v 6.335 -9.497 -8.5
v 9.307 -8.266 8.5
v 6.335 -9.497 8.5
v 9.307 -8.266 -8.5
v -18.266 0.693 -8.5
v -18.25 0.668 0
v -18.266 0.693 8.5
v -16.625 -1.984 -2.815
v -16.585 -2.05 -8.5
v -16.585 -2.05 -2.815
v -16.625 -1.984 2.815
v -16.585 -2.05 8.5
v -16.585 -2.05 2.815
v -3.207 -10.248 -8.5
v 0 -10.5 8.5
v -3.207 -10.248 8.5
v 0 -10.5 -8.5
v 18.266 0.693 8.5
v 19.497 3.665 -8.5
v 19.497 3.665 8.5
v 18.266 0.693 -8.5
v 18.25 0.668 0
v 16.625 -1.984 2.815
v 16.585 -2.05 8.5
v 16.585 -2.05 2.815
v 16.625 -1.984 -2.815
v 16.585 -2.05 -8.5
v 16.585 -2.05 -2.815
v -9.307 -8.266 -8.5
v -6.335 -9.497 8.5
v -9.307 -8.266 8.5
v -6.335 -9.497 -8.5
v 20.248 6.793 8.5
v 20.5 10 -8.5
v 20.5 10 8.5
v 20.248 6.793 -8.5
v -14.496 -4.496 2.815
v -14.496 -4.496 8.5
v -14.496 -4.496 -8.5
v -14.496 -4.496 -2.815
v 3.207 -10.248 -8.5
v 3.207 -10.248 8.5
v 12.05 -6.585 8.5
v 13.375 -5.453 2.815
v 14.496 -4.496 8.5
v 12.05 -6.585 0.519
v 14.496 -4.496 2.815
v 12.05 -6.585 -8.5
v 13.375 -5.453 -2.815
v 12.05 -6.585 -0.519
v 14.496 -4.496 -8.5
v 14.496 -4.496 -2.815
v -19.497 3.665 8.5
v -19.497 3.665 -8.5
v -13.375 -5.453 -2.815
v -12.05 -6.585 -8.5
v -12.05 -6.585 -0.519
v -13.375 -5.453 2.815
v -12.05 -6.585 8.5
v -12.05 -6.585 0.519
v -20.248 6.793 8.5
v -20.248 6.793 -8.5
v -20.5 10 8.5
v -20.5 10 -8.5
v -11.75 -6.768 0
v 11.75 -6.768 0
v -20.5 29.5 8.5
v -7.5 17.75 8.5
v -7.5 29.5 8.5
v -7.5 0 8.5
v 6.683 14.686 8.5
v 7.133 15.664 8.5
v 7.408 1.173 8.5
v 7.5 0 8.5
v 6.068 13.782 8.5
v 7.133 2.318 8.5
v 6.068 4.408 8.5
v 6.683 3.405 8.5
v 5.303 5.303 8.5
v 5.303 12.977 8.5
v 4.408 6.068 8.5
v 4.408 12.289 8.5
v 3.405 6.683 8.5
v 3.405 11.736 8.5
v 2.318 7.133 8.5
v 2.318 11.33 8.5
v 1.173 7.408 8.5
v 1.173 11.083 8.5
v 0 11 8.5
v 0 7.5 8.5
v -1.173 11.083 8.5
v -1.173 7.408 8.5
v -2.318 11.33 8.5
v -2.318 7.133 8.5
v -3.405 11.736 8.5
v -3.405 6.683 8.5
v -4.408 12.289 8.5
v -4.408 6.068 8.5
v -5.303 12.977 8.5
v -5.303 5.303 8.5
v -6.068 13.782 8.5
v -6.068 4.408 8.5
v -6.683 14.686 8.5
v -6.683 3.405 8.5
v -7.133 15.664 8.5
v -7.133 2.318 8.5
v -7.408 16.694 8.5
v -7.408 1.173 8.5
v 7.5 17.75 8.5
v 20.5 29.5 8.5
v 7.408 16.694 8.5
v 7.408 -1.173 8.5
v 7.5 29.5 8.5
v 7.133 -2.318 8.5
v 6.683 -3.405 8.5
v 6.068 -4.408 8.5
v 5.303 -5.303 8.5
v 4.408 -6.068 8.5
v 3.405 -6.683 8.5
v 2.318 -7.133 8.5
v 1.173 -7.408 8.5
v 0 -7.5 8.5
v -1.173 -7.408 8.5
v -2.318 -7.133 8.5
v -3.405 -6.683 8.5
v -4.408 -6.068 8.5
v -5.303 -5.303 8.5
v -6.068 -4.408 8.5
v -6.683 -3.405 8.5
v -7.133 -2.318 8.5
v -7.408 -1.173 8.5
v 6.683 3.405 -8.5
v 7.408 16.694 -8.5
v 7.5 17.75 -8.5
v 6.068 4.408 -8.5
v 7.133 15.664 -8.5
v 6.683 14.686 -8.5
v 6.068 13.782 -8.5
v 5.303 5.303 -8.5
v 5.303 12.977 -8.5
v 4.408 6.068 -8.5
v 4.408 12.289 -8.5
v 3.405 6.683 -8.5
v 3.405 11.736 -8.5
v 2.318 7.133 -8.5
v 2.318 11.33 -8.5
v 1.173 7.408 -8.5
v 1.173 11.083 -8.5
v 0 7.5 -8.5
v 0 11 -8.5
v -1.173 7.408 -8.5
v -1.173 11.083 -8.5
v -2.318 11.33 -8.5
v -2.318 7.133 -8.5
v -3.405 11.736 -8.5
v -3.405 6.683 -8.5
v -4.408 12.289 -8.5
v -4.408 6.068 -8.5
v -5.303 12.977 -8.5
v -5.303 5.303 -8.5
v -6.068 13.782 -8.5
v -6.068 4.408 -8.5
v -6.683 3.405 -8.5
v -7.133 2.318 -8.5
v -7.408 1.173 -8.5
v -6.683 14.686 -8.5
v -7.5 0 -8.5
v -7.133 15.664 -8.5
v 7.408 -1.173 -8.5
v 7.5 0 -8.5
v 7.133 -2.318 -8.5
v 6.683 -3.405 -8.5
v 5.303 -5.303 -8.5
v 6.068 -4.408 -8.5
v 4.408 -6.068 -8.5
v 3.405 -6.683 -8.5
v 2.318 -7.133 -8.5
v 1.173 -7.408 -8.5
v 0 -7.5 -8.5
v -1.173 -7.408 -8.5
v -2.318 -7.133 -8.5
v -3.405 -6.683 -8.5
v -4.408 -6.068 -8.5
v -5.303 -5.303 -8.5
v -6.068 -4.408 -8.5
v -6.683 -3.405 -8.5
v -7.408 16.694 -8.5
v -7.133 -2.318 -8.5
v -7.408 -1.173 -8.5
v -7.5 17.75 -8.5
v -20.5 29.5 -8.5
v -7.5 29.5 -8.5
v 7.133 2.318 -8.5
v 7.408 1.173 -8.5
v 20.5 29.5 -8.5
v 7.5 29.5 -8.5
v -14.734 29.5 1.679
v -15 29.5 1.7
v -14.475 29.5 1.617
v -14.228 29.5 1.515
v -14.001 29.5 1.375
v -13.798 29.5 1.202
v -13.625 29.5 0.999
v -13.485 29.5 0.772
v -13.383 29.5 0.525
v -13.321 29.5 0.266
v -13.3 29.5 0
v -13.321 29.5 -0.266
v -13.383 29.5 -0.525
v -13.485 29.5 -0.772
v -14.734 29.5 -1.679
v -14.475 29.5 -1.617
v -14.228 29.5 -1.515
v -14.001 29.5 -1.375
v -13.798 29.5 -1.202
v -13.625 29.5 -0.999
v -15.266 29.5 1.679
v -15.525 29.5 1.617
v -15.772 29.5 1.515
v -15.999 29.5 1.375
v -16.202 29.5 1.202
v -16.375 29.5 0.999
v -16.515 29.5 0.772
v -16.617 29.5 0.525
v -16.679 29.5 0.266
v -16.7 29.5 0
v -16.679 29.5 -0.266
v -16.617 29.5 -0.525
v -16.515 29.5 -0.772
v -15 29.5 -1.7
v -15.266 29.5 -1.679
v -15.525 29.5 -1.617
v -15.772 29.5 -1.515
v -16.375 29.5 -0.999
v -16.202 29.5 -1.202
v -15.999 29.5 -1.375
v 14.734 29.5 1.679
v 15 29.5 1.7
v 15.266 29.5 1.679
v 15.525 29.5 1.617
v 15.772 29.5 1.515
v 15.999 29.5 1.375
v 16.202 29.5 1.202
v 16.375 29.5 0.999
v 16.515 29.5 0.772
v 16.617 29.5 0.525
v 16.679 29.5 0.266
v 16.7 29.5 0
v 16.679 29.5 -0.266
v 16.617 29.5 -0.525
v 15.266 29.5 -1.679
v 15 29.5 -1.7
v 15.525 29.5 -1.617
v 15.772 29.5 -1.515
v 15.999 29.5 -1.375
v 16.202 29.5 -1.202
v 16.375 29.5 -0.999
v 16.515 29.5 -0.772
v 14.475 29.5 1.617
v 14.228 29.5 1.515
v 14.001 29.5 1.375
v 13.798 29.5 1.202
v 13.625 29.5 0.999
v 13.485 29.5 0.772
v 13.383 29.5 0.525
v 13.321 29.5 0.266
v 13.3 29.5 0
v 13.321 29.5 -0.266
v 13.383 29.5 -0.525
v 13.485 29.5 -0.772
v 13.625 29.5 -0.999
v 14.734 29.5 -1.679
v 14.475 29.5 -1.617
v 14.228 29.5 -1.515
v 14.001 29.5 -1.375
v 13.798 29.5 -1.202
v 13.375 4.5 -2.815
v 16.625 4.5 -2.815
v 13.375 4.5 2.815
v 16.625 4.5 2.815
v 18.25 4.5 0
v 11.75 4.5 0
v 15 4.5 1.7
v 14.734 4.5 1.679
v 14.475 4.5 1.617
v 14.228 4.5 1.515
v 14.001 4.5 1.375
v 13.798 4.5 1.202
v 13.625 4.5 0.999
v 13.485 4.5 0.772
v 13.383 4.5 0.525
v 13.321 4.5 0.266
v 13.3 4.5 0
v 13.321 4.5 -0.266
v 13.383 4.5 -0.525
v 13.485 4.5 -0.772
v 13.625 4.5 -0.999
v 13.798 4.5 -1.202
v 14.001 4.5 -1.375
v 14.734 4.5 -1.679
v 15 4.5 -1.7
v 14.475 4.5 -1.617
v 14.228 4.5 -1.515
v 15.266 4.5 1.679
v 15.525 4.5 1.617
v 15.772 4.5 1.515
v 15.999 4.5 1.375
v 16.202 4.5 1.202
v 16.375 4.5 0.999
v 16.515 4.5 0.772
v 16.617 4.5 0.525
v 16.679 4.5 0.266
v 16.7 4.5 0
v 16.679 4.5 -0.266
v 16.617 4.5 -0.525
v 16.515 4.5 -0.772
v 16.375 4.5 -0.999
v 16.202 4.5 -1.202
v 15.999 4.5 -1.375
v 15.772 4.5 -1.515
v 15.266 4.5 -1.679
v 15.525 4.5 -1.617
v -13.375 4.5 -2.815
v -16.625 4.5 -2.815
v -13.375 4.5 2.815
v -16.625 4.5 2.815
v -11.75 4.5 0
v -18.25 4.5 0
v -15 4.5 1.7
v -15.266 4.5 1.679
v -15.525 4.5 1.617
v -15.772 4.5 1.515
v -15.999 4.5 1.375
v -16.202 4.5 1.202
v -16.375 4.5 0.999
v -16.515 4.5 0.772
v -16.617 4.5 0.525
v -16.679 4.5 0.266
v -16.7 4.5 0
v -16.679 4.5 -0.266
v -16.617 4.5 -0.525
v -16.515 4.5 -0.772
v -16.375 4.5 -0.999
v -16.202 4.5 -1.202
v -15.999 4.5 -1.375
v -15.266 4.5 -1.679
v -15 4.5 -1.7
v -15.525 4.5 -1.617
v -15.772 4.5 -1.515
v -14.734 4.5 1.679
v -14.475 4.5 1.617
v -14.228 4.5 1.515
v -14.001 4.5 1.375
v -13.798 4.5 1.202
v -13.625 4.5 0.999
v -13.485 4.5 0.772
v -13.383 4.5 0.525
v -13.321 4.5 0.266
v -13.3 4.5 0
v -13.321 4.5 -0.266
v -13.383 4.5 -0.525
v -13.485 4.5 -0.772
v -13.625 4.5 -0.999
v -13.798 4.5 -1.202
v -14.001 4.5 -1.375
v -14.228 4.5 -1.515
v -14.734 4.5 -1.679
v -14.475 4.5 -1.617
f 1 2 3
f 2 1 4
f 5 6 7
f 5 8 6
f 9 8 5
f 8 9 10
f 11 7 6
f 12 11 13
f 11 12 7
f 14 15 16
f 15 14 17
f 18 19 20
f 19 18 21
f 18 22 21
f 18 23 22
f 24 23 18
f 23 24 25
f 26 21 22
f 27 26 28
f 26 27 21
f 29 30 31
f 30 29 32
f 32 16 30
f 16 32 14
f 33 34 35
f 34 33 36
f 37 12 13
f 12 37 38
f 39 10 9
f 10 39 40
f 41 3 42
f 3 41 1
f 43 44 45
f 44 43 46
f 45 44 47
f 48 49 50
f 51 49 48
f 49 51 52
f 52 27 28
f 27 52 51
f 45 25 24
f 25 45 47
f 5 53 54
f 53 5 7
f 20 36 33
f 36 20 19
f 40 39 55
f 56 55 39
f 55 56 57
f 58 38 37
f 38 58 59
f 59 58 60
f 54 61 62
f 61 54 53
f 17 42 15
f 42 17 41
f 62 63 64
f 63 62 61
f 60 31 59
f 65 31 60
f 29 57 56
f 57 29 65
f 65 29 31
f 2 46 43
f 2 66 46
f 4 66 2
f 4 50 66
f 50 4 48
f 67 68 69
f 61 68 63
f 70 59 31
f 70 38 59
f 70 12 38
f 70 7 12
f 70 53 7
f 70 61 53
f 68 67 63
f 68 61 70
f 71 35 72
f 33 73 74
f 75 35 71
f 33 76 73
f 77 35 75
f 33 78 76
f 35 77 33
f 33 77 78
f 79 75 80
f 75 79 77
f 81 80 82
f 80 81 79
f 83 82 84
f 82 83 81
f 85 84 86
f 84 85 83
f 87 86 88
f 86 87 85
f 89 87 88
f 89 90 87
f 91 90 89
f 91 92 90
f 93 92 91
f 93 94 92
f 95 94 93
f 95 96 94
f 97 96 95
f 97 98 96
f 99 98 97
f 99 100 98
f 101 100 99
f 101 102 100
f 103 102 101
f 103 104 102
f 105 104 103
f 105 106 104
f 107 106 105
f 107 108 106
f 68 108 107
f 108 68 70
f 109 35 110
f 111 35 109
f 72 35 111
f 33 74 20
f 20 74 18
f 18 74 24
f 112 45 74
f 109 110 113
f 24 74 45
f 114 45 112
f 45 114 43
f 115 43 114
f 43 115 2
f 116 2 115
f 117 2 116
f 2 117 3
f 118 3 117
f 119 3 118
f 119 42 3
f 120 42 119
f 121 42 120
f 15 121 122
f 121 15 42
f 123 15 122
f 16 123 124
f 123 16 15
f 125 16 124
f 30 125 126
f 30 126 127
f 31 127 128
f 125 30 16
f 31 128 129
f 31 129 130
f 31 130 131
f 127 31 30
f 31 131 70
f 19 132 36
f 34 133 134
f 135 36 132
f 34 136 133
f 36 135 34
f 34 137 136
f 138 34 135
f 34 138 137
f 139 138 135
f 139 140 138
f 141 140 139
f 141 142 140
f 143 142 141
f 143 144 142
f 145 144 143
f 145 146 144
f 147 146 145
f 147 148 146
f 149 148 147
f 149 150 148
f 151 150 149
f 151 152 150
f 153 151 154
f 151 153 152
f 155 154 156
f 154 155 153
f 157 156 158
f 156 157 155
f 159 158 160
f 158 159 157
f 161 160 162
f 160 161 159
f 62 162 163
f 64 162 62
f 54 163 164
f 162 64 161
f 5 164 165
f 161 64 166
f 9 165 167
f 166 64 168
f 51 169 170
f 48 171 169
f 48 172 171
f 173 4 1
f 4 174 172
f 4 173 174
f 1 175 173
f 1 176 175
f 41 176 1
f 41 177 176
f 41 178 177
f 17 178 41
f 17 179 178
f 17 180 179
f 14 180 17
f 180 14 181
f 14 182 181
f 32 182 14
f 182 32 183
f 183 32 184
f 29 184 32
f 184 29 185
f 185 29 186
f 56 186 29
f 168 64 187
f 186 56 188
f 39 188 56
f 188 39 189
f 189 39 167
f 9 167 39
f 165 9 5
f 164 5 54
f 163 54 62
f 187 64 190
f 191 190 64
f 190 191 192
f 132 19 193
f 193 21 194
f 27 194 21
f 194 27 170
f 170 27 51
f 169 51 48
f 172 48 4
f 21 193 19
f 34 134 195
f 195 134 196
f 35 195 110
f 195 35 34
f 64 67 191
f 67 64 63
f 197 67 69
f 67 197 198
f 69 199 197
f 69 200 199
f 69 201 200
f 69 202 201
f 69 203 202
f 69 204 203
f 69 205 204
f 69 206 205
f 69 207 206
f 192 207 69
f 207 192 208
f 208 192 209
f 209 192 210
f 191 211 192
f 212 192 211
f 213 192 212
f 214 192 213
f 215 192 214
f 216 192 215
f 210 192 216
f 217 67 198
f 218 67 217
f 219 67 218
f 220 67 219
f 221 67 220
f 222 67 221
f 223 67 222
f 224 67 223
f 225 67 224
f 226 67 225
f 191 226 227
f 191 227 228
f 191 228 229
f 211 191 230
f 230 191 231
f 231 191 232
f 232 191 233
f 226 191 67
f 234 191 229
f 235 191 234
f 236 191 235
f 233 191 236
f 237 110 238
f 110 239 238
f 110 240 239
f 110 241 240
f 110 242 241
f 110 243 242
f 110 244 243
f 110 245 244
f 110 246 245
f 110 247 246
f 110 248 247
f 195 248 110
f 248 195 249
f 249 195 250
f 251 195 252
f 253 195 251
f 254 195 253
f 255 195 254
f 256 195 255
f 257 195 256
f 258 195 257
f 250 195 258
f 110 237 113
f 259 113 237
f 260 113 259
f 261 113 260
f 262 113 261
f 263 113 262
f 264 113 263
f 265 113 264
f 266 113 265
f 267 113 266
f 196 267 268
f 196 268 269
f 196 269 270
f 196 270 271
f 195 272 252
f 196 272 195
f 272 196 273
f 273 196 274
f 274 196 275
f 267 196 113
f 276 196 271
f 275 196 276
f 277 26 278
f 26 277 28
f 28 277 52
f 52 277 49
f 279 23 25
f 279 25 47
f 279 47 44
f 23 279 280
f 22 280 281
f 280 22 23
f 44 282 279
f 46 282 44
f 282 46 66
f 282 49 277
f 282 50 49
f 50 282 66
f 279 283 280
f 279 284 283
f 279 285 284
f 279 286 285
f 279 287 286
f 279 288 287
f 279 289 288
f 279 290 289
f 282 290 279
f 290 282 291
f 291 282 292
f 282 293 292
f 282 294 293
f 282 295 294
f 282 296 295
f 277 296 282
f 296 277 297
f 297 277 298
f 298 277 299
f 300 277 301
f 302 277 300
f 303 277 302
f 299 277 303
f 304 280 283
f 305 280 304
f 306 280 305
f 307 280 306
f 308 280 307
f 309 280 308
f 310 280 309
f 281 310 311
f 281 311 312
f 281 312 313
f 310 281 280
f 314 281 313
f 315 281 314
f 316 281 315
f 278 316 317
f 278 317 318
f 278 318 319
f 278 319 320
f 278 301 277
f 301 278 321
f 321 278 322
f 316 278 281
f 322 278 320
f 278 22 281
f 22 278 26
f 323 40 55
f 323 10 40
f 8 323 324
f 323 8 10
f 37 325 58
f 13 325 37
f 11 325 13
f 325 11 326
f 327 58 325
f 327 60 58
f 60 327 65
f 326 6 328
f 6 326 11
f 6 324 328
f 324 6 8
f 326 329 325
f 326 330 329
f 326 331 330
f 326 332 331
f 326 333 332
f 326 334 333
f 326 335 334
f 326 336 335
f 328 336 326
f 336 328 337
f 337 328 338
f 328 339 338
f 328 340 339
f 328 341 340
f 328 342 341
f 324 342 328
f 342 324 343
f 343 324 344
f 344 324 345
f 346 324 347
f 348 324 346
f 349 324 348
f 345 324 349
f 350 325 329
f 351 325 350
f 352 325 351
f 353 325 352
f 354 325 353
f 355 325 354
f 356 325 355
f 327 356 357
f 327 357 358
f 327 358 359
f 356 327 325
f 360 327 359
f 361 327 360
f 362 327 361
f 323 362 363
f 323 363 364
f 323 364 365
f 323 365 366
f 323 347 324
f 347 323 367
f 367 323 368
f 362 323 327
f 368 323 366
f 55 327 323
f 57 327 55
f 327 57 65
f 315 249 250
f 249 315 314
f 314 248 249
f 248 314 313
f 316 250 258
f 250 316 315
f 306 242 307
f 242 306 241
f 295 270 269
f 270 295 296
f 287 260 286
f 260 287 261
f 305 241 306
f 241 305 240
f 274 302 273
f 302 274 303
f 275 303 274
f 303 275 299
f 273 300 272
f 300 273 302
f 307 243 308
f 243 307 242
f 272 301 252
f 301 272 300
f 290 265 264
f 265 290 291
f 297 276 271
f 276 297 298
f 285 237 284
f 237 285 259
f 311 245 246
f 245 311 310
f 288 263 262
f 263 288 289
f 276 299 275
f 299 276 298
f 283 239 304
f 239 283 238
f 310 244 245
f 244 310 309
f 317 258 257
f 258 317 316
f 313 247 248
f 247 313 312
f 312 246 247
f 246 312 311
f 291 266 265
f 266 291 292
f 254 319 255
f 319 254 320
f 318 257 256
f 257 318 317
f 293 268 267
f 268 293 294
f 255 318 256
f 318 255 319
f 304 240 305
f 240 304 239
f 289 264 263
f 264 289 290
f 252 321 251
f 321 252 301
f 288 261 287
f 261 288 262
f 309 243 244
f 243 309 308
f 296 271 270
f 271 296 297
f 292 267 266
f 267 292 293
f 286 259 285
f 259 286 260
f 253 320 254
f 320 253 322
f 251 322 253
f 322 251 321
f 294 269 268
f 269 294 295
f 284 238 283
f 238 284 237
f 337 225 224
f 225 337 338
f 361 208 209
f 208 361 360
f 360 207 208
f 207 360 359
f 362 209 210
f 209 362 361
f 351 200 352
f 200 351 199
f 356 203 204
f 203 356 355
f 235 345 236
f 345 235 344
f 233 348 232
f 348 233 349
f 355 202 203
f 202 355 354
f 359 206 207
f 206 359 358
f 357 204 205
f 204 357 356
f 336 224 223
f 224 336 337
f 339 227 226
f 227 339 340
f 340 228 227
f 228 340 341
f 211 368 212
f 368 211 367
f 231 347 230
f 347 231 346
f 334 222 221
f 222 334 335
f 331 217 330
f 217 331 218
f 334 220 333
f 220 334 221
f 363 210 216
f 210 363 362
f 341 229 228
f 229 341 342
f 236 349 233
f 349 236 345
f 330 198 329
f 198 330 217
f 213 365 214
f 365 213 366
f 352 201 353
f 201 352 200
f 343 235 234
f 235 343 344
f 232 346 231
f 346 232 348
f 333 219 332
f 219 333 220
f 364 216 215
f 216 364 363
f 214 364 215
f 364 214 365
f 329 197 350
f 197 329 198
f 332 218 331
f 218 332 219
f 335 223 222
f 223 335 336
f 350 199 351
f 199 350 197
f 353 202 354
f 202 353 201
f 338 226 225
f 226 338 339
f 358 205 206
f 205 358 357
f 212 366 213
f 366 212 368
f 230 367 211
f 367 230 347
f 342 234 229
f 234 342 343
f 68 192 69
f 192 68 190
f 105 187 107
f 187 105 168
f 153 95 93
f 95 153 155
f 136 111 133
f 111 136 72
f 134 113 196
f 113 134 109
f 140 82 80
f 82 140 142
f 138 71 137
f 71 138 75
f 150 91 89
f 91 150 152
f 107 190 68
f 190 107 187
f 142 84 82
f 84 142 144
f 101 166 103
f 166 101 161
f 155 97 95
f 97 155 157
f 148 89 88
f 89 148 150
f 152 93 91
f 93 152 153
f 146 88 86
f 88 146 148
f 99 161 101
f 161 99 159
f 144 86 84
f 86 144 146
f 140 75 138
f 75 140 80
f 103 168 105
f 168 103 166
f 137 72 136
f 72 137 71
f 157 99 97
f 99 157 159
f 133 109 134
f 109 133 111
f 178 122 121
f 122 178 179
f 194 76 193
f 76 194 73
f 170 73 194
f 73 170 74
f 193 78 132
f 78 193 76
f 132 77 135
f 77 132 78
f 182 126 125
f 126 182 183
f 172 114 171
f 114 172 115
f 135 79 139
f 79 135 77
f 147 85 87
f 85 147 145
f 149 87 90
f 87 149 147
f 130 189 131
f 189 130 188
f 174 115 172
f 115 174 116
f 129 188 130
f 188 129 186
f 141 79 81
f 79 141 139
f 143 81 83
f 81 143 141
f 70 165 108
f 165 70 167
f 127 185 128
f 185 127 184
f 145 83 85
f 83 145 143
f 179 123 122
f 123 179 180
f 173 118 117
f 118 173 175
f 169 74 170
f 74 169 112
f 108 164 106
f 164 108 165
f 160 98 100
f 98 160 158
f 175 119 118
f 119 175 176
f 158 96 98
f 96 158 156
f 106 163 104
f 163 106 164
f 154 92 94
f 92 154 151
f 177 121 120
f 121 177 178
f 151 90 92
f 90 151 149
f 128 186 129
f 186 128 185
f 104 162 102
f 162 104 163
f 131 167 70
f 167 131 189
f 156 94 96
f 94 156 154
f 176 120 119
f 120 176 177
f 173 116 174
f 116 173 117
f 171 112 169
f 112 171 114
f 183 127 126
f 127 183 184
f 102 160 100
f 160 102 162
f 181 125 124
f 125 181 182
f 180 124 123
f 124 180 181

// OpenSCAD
//Set height : distance between the plate and the center of the 8mm rod
height=29.5;//[10:0.5:50]

//Set width 
width=17;//[10:0.5:45]

//Screw spacing
Screw_spacing=30;//[20:0.5:35]

//What kind of bearing? or bearing mount?
bearing_option=1;//[0:printed bearing,1:15mm bearing no gap,2:15mm bearing with gap,3:15mm bearing hold with filament]
//Offset bearing position
bearing_shift_position=0;//[0:0.1:1]

//printer accuracy, positive value will add some space for bearings plug
tolerance=0;//[-0.3:0.05:1]
//definition
$fn=40;//[40:low,60:medium,100:high]

//////////////////////////////////////////////
module dent(angle) {
rotate([0,0,angle]) translate([tolerance,0,0]) hull() {
translate([4.3,-0.4,0]) cylinder(d=0.5,h=width+4,center=true);
translate([4.325,0.1,0]) cylinder(d=0.5,h=width+4,center=true);
translate([6.5,0.2,0]) cylinder(d=0.5,h=width+4,center=true);
translate([6.2,2.55,0]) cylinder(d=0.5,h=width+4,center=true);
}
}
module bearing(a) {
    if(a==0) {
        difference() {
            cylinder(d=13,h=width+2,center=true);
            for (i=[0:360/9:360-360/9]) dent(i);
        }
    }
    
    else if(a==1) {
        cylinder(d=15+2*tolerance,h=width+2,center=true);
    }
    
    else if(a==2) {
        difference() {
            cylinder(d=15+2*tolerance+2,h=width+2,center=true);
            for (i=[45:90:315]) rotate([0,0,i]) translate([7.5+tolerance+1.75/2,0,0]) cylinder(d=1.75,h=width+2+2,center=true);
            }
    }
    
    else if(a==3) {
        cylinder(d=15+2*tolerance+1,h=width+2,center=true);
        for (i=[45:90:315]) rotate([0,0,i]) translate([7.5+tolerance+1.25/2,0,0]) cylinder(d=1.75,h=width+2+2,center=true);
    }
}

module Common_part() {
    difference() {
        union() {
            difference() {
                translate([0,10,0]) cylinder(d=41,h=width,center=true);
                translate([0,43/2+10,0]) cube([43,43,width+2],center=true);
            }
            translate([0,5+height/2,0]) cube([41,height-10,width],center=true);
        }
        hull() {
            for (i=[17.75,17.75+height]) translate([0,i,0]) scale([1,0.9,1]) cylinder(d=15,h=width+2,center=true);}
    
        for(i=[Screw_spacing/2,-Screw_spacing/2]) translate([i,-2.5,0]) rotate([90,0,0]) rotate([0,0,0]) cylinder(d=6.5,h=14,$fn=6,center=true);
        for(i=[Screw_spacing/2,-Screw_spacing/2]) translate([i,-2.5,0]) rotate([-90,0,0]) cylinder(d=3.4,h=height+5);
    
    }    
    
}



difference() {
    Common_part();
    translate([bearing_shift_position,0,0]) bearing(bearing_option);
}
